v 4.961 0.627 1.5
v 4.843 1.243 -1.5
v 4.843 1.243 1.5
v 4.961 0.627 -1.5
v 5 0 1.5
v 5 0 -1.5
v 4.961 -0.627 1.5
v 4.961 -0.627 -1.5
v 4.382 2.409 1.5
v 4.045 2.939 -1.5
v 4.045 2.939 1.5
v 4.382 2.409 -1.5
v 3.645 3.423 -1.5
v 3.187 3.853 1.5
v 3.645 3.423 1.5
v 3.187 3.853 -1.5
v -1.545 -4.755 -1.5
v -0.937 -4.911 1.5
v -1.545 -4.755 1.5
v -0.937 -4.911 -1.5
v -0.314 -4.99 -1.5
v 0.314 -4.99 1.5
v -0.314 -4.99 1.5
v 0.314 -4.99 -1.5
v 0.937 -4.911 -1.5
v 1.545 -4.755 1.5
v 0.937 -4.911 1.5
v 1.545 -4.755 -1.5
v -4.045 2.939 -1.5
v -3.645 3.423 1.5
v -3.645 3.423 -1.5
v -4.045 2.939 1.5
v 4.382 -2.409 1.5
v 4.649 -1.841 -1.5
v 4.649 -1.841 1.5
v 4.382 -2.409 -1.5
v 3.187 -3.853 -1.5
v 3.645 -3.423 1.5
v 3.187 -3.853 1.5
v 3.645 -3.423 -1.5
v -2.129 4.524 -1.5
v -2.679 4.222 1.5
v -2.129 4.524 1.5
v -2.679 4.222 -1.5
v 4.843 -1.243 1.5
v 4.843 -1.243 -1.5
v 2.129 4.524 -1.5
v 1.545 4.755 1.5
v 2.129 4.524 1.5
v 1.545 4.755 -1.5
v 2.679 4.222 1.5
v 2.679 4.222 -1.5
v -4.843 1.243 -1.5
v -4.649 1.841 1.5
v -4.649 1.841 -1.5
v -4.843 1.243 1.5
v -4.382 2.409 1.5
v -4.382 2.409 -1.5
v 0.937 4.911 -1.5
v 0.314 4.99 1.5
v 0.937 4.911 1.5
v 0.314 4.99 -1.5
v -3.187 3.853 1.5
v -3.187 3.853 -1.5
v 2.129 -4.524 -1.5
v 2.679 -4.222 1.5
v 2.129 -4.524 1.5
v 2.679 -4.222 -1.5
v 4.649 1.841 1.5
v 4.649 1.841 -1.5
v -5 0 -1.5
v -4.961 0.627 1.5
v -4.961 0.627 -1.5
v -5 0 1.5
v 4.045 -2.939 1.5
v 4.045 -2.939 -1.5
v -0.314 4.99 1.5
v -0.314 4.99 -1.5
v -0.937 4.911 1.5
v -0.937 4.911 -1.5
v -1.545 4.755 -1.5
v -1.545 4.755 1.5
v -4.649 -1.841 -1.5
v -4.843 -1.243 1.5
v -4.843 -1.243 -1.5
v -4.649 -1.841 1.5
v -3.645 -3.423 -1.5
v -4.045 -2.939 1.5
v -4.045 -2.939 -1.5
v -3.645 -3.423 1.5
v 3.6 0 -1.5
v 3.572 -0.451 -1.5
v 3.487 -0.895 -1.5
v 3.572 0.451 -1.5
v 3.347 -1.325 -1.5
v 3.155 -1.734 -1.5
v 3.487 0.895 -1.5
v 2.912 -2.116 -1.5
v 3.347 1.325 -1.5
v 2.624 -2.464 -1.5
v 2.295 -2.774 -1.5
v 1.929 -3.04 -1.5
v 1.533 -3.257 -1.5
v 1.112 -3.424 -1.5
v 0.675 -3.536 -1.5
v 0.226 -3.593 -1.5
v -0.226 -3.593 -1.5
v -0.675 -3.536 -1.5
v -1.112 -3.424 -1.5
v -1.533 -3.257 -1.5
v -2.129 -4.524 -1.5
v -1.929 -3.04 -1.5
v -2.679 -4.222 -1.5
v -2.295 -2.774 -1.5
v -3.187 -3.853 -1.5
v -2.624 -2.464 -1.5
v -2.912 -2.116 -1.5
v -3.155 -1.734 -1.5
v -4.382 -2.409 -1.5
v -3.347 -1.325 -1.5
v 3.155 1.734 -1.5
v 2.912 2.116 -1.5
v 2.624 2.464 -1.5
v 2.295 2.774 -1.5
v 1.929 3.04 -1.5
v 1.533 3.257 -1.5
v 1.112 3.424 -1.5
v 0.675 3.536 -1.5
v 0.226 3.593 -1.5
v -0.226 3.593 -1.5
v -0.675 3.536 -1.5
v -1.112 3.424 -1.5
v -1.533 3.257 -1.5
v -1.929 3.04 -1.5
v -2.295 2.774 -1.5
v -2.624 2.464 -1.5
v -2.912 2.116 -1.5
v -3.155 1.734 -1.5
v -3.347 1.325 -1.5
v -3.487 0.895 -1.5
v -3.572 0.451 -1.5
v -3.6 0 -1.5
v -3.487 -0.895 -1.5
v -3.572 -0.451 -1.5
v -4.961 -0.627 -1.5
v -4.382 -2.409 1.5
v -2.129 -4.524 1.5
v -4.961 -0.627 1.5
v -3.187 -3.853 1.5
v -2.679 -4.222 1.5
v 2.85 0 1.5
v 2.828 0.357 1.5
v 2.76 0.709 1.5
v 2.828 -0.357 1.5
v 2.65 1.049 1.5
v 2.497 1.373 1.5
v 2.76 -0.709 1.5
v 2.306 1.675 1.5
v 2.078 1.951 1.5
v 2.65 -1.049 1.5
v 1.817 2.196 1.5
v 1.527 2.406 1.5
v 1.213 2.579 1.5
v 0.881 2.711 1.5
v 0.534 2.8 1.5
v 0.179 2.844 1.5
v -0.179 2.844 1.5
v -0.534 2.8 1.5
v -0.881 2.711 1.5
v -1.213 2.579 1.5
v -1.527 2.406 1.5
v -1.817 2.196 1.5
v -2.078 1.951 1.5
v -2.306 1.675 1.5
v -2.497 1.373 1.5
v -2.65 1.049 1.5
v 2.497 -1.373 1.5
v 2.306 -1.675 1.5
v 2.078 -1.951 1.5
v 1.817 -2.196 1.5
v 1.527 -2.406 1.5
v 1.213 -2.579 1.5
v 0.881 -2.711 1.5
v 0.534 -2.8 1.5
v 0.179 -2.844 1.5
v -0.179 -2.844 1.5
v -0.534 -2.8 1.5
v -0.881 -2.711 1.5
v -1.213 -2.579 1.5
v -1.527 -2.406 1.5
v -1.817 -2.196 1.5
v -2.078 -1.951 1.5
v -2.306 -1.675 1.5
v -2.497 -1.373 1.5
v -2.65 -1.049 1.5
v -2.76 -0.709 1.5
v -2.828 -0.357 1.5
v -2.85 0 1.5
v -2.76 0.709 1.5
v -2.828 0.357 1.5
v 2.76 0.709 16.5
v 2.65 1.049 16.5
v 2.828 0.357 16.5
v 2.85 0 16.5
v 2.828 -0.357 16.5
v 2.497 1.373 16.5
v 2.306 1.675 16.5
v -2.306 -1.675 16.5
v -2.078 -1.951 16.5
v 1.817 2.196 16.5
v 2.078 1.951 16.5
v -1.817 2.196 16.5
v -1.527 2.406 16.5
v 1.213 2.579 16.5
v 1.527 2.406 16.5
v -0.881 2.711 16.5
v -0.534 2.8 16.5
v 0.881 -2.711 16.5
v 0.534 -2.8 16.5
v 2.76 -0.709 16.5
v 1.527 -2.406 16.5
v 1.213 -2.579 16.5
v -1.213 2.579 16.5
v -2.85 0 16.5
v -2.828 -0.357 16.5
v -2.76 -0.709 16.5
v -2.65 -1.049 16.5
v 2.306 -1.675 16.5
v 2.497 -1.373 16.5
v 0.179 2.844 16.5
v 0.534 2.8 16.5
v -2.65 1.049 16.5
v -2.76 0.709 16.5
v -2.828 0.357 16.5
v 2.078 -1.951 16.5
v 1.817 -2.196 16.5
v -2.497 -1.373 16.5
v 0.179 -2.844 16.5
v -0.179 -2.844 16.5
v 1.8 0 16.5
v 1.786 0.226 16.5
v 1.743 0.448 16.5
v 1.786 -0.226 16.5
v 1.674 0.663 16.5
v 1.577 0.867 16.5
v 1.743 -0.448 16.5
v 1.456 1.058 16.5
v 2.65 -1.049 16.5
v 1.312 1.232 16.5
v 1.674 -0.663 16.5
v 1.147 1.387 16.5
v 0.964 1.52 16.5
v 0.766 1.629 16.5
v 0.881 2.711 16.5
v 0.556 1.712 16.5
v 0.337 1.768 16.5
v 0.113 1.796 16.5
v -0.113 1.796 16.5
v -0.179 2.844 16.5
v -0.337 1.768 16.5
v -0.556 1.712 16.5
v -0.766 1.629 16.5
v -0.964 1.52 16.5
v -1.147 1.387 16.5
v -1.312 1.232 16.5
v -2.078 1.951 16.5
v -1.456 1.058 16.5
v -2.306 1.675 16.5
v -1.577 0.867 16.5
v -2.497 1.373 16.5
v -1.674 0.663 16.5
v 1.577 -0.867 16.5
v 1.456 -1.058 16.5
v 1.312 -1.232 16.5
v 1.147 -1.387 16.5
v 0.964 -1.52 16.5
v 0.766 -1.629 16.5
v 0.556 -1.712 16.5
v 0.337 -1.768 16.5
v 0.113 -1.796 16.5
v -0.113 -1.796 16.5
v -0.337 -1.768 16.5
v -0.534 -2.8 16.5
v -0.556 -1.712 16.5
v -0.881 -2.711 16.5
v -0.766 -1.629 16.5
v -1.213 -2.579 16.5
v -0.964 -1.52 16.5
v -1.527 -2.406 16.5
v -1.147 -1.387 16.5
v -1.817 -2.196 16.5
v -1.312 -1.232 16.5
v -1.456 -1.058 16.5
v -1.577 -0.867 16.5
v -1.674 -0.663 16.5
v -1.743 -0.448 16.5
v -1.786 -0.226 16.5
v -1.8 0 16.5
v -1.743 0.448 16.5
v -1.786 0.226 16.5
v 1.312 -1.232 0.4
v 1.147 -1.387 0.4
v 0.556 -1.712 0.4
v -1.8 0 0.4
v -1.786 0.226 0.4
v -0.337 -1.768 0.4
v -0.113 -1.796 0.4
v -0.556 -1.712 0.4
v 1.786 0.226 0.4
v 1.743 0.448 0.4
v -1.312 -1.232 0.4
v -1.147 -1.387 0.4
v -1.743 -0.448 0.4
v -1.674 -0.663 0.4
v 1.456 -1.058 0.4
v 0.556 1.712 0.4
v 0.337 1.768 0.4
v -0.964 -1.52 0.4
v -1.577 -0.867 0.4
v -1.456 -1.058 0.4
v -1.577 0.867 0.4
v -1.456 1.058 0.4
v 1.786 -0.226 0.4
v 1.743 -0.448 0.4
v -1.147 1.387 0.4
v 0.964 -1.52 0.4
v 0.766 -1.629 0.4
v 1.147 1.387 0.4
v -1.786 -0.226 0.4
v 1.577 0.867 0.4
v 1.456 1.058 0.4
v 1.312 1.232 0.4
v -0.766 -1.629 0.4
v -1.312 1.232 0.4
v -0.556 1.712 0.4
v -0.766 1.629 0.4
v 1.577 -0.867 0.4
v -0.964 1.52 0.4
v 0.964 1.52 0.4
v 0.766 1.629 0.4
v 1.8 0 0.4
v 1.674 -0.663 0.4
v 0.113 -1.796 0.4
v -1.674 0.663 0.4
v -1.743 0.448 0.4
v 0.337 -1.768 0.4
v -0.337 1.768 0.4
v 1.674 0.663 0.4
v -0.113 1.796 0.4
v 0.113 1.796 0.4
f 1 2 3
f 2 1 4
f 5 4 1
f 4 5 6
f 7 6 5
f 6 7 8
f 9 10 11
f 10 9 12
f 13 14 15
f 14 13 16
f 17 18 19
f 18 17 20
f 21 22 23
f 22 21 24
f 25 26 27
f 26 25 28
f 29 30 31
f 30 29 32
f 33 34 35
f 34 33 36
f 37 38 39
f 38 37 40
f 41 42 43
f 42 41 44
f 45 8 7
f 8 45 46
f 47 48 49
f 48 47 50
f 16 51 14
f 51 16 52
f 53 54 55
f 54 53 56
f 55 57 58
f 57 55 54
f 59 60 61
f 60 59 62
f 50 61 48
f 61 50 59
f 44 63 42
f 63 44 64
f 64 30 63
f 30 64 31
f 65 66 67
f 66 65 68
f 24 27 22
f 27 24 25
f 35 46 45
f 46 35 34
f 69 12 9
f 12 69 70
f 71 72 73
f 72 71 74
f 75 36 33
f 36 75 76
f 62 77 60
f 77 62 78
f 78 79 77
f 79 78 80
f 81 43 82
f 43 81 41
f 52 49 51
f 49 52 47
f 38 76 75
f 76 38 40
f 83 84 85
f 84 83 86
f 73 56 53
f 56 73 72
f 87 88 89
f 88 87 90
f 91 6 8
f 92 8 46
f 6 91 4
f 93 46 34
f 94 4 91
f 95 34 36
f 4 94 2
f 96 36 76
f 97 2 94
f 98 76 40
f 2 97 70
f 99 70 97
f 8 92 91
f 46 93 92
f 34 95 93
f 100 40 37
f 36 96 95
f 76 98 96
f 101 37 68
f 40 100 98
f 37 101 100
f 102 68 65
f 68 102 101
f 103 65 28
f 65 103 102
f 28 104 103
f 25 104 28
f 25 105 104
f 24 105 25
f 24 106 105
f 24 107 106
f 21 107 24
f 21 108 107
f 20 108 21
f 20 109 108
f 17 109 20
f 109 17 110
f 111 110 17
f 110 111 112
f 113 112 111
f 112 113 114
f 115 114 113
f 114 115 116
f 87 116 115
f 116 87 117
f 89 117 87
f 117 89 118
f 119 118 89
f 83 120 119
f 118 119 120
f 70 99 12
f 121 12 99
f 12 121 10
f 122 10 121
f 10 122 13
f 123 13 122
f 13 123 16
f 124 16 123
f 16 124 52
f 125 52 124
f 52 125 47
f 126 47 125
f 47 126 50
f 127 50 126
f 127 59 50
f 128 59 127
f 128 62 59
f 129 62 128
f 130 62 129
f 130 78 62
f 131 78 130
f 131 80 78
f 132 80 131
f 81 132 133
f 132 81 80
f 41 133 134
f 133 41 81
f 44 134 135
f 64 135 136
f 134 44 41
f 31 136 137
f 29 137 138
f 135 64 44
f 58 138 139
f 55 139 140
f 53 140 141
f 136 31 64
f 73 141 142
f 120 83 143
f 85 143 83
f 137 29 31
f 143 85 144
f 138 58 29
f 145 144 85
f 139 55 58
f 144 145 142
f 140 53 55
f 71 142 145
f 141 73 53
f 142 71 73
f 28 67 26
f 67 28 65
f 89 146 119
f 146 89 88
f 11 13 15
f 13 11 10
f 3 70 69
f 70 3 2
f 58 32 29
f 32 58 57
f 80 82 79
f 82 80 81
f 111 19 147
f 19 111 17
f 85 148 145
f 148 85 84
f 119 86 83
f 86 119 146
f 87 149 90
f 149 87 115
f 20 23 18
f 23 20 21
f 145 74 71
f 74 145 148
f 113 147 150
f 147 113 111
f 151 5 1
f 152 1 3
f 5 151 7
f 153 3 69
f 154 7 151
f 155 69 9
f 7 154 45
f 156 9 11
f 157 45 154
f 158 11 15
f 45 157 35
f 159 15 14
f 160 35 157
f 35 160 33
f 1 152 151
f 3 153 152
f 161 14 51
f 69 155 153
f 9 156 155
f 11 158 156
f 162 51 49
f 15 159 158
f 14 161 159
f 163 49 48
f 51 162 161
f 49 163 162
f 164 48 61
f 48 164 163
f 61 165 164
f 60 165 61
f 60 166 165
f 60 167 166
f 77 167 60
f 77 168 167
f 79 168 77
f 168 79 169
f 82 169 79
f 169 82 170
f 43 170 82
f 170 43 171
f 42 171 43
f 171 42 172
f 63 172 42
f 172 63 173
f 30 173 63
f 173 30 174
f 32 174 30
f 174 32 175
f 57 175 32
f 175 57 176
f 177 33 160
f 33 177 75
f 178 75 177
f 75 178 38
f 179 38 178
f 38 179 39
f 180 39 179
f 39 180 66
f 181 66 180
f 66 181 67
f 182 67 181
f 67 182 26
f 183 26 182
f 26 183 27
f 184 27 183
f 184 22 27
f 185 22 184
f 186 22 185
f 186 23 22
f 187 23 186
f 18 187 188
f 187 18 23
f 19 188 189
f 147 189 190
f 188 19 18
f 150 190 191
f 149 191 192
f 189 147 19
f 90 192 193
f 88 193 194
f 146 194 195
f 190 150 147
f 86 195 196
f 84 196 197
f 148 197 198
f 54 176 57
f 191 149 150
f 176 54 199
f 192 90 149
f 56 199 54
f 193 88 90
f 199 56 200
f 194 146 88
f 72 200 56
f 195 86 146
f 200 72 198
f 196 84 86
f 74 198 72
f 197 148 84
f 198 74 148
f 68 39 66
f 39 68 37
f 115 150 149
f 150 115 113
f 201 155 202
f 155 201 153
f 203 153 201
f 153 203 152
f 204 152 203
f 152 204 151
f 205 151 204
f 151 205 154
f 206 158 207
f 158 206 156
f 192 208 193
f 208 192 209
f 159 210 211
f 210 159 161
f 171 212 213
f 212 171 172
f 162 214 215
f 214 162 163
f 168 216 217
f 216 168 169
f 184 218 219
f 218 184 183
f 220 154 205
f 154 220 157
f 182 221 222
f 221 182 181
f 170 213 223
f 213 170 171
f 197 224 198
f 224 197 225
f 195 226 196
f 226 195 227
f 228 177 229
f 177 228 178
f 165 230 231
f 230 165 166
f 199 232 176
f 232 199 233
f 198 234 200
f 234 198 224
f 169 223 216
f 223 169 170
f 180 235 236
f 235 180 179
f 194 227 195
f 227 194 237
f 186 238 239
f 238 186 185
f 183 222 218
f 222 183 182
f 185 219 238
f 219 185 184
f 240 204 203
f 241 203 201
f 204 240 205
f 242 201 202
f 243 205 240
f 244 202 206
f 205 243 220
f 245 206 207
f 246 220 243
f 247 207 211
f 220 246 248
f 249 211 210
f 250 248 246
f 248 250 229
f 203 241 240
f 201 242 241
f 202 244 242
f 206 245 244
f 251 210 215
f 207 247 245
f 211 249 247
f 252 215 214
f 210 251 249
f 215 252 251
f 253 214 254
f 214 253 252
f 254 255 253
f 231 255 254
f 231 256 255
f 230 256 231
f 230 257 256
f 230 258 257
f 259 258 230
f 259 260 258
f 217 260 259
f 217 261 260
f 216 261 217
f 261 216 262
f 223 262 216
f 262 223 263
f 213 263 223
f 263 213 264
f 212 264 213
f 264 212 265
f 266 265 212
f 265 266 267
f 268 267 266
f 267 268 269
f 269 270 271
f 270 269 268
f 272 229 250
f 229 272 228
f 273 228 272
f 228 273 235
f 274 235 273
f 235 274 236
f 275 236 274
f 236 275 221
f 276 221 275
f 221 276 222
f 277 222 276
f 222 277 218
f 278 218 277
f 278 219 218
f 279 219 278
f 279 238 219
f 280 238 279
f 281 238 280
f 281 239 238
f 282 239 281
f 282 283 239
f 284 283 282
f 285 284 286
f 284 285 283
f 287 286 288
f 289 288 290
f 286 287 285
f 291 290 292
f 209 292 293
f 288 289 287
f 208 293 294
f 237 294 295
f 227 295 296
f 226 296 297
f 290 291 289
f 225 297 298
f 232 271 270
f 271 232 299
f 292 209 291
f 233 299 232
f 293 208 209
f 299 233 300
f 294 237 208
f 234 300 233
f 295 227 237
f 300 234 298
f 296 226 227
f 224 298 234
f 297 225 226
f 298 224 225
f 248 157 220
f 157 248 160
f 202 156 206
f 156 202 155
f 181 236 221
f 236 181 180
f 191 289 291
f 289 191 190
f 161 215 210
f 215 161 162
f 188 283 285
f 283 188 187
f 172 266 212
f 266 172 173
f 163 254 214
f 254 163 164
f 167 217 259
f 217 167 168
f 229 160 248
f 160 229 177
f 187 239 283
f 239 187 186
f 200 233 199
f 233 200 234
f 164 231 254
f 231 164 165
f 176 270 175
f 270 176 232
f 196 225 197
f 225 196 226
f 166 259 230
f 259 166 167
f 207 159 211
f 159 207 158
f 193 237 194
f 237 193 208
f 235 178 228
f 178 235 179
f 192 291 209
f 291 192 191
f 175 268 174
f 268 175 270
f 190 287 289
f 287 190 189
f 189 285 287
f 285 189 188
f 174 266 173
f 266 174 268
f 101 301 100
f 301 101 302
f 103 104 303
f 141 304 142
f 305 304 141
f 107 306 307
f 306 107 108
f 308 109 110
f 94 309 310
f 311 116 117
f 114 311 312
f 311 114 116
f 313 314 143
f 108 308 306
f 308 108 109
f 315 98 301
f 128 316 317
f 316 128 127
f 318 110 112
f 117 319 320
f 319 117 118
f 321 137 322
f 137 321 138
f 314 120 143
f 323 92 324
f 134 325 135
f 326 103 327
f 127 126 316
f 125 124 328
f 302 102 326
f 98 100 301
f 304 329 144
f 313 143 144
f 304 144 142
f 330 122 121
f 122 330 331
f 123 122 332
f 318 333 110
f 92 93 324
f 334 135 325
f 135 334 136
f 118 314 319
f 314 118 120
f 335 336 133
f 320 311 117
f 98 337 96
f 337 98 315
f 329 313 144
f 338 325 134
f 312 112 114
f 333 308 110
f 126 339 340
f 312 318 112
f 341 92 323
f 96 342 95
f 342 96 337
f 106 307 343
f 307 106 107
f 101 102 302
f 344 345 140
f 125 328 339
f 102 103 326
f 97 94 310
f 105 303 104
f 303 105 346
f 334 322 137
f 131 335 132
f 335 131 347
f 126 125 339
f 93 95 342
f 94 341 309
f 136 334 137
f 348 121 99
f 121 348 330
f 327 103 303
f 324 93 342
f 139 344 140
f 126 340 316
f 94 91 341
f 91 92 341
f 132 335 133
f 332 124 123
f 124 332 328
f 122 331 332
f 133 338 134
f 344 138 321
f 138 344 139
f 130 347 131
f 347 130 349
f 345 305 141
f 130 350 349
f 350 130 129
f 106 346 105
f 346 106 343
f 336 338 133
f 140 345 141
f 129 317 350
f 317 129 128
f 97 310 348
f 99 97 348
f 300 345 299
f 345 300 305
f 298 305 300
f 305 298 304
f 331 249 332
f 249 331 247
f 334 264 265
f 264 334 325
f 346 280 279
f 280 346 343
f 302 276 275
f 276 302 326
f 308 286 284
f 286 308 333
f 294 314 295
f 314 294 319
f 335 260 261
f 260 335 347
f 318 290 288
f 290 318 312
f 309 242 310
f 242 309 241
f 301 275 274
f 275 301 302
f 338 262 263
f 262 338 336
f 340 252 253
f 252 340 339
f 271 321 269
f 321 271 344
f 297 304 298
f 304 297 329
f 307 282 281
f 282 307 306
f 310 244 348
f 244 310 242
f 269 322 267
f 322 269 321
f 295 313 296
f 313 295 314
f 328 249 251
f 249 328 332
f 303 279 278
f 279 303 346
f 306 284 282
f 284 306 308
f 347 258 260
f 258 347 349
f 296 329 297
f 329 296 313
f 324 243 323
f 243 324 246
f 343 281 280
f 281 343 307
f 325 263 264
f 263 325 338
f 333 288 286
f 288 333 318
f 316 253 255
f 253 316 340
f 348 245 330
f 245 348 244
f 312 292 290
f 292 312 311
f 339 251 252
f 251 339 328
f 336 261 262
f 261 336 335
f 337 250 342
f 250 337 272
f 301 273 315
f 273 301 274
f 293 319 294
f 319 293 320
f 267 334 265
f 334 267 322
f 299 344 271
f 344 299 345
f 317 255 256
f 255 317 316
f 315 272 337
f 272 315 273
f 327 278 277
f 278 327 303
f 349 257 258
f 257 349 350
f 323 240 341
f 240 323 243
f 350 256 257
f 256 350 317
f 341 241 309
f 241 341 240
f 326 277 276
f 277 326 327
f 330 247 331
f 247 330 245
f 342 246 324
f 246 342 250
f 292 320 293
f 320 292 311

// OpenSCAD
$fn = 50;


difference() {
	union() {
		translate(v = [0, 0, -1.5000000000]) {
			cylinder(h = 3, r = 5.0000000000);
		}
		translate(v = [0, 0, -1.5000000000]) {
			cylinder(h = 18, r = 2.8500000000);
		}
	}
	union() {
		translate(v = [0, 0, -1.5000000000]) {
			rotate(a = [0, 180, 0]) {
				difference() {
					union() {
						translate(v = [0, 0, -18.0000000000]) {
							cylinder(h = 18, r = 1.5000000000);
						}
						translate(v = [0, 0, -1.9000000000]) {
							cylinder(h = 1.9000000000, r1 = 1.8000000000, r2 = 3.6000000000);
						}
						translate(v = [0, 0, -18.0000000000]) {
							cylinder(h = 18, r = 1.8000000000);
						}
						translate(v = [0, 0, -18.0000000000]) {
							cylinder(h = 18, r = 1.5000000000);
						}
					}
					union();
				}
			}
		}
		translate(v = [0, 0, -50.0000000000]) {
			cylinder(h = 100, r = 1.8000000000);
		}
	}
}
